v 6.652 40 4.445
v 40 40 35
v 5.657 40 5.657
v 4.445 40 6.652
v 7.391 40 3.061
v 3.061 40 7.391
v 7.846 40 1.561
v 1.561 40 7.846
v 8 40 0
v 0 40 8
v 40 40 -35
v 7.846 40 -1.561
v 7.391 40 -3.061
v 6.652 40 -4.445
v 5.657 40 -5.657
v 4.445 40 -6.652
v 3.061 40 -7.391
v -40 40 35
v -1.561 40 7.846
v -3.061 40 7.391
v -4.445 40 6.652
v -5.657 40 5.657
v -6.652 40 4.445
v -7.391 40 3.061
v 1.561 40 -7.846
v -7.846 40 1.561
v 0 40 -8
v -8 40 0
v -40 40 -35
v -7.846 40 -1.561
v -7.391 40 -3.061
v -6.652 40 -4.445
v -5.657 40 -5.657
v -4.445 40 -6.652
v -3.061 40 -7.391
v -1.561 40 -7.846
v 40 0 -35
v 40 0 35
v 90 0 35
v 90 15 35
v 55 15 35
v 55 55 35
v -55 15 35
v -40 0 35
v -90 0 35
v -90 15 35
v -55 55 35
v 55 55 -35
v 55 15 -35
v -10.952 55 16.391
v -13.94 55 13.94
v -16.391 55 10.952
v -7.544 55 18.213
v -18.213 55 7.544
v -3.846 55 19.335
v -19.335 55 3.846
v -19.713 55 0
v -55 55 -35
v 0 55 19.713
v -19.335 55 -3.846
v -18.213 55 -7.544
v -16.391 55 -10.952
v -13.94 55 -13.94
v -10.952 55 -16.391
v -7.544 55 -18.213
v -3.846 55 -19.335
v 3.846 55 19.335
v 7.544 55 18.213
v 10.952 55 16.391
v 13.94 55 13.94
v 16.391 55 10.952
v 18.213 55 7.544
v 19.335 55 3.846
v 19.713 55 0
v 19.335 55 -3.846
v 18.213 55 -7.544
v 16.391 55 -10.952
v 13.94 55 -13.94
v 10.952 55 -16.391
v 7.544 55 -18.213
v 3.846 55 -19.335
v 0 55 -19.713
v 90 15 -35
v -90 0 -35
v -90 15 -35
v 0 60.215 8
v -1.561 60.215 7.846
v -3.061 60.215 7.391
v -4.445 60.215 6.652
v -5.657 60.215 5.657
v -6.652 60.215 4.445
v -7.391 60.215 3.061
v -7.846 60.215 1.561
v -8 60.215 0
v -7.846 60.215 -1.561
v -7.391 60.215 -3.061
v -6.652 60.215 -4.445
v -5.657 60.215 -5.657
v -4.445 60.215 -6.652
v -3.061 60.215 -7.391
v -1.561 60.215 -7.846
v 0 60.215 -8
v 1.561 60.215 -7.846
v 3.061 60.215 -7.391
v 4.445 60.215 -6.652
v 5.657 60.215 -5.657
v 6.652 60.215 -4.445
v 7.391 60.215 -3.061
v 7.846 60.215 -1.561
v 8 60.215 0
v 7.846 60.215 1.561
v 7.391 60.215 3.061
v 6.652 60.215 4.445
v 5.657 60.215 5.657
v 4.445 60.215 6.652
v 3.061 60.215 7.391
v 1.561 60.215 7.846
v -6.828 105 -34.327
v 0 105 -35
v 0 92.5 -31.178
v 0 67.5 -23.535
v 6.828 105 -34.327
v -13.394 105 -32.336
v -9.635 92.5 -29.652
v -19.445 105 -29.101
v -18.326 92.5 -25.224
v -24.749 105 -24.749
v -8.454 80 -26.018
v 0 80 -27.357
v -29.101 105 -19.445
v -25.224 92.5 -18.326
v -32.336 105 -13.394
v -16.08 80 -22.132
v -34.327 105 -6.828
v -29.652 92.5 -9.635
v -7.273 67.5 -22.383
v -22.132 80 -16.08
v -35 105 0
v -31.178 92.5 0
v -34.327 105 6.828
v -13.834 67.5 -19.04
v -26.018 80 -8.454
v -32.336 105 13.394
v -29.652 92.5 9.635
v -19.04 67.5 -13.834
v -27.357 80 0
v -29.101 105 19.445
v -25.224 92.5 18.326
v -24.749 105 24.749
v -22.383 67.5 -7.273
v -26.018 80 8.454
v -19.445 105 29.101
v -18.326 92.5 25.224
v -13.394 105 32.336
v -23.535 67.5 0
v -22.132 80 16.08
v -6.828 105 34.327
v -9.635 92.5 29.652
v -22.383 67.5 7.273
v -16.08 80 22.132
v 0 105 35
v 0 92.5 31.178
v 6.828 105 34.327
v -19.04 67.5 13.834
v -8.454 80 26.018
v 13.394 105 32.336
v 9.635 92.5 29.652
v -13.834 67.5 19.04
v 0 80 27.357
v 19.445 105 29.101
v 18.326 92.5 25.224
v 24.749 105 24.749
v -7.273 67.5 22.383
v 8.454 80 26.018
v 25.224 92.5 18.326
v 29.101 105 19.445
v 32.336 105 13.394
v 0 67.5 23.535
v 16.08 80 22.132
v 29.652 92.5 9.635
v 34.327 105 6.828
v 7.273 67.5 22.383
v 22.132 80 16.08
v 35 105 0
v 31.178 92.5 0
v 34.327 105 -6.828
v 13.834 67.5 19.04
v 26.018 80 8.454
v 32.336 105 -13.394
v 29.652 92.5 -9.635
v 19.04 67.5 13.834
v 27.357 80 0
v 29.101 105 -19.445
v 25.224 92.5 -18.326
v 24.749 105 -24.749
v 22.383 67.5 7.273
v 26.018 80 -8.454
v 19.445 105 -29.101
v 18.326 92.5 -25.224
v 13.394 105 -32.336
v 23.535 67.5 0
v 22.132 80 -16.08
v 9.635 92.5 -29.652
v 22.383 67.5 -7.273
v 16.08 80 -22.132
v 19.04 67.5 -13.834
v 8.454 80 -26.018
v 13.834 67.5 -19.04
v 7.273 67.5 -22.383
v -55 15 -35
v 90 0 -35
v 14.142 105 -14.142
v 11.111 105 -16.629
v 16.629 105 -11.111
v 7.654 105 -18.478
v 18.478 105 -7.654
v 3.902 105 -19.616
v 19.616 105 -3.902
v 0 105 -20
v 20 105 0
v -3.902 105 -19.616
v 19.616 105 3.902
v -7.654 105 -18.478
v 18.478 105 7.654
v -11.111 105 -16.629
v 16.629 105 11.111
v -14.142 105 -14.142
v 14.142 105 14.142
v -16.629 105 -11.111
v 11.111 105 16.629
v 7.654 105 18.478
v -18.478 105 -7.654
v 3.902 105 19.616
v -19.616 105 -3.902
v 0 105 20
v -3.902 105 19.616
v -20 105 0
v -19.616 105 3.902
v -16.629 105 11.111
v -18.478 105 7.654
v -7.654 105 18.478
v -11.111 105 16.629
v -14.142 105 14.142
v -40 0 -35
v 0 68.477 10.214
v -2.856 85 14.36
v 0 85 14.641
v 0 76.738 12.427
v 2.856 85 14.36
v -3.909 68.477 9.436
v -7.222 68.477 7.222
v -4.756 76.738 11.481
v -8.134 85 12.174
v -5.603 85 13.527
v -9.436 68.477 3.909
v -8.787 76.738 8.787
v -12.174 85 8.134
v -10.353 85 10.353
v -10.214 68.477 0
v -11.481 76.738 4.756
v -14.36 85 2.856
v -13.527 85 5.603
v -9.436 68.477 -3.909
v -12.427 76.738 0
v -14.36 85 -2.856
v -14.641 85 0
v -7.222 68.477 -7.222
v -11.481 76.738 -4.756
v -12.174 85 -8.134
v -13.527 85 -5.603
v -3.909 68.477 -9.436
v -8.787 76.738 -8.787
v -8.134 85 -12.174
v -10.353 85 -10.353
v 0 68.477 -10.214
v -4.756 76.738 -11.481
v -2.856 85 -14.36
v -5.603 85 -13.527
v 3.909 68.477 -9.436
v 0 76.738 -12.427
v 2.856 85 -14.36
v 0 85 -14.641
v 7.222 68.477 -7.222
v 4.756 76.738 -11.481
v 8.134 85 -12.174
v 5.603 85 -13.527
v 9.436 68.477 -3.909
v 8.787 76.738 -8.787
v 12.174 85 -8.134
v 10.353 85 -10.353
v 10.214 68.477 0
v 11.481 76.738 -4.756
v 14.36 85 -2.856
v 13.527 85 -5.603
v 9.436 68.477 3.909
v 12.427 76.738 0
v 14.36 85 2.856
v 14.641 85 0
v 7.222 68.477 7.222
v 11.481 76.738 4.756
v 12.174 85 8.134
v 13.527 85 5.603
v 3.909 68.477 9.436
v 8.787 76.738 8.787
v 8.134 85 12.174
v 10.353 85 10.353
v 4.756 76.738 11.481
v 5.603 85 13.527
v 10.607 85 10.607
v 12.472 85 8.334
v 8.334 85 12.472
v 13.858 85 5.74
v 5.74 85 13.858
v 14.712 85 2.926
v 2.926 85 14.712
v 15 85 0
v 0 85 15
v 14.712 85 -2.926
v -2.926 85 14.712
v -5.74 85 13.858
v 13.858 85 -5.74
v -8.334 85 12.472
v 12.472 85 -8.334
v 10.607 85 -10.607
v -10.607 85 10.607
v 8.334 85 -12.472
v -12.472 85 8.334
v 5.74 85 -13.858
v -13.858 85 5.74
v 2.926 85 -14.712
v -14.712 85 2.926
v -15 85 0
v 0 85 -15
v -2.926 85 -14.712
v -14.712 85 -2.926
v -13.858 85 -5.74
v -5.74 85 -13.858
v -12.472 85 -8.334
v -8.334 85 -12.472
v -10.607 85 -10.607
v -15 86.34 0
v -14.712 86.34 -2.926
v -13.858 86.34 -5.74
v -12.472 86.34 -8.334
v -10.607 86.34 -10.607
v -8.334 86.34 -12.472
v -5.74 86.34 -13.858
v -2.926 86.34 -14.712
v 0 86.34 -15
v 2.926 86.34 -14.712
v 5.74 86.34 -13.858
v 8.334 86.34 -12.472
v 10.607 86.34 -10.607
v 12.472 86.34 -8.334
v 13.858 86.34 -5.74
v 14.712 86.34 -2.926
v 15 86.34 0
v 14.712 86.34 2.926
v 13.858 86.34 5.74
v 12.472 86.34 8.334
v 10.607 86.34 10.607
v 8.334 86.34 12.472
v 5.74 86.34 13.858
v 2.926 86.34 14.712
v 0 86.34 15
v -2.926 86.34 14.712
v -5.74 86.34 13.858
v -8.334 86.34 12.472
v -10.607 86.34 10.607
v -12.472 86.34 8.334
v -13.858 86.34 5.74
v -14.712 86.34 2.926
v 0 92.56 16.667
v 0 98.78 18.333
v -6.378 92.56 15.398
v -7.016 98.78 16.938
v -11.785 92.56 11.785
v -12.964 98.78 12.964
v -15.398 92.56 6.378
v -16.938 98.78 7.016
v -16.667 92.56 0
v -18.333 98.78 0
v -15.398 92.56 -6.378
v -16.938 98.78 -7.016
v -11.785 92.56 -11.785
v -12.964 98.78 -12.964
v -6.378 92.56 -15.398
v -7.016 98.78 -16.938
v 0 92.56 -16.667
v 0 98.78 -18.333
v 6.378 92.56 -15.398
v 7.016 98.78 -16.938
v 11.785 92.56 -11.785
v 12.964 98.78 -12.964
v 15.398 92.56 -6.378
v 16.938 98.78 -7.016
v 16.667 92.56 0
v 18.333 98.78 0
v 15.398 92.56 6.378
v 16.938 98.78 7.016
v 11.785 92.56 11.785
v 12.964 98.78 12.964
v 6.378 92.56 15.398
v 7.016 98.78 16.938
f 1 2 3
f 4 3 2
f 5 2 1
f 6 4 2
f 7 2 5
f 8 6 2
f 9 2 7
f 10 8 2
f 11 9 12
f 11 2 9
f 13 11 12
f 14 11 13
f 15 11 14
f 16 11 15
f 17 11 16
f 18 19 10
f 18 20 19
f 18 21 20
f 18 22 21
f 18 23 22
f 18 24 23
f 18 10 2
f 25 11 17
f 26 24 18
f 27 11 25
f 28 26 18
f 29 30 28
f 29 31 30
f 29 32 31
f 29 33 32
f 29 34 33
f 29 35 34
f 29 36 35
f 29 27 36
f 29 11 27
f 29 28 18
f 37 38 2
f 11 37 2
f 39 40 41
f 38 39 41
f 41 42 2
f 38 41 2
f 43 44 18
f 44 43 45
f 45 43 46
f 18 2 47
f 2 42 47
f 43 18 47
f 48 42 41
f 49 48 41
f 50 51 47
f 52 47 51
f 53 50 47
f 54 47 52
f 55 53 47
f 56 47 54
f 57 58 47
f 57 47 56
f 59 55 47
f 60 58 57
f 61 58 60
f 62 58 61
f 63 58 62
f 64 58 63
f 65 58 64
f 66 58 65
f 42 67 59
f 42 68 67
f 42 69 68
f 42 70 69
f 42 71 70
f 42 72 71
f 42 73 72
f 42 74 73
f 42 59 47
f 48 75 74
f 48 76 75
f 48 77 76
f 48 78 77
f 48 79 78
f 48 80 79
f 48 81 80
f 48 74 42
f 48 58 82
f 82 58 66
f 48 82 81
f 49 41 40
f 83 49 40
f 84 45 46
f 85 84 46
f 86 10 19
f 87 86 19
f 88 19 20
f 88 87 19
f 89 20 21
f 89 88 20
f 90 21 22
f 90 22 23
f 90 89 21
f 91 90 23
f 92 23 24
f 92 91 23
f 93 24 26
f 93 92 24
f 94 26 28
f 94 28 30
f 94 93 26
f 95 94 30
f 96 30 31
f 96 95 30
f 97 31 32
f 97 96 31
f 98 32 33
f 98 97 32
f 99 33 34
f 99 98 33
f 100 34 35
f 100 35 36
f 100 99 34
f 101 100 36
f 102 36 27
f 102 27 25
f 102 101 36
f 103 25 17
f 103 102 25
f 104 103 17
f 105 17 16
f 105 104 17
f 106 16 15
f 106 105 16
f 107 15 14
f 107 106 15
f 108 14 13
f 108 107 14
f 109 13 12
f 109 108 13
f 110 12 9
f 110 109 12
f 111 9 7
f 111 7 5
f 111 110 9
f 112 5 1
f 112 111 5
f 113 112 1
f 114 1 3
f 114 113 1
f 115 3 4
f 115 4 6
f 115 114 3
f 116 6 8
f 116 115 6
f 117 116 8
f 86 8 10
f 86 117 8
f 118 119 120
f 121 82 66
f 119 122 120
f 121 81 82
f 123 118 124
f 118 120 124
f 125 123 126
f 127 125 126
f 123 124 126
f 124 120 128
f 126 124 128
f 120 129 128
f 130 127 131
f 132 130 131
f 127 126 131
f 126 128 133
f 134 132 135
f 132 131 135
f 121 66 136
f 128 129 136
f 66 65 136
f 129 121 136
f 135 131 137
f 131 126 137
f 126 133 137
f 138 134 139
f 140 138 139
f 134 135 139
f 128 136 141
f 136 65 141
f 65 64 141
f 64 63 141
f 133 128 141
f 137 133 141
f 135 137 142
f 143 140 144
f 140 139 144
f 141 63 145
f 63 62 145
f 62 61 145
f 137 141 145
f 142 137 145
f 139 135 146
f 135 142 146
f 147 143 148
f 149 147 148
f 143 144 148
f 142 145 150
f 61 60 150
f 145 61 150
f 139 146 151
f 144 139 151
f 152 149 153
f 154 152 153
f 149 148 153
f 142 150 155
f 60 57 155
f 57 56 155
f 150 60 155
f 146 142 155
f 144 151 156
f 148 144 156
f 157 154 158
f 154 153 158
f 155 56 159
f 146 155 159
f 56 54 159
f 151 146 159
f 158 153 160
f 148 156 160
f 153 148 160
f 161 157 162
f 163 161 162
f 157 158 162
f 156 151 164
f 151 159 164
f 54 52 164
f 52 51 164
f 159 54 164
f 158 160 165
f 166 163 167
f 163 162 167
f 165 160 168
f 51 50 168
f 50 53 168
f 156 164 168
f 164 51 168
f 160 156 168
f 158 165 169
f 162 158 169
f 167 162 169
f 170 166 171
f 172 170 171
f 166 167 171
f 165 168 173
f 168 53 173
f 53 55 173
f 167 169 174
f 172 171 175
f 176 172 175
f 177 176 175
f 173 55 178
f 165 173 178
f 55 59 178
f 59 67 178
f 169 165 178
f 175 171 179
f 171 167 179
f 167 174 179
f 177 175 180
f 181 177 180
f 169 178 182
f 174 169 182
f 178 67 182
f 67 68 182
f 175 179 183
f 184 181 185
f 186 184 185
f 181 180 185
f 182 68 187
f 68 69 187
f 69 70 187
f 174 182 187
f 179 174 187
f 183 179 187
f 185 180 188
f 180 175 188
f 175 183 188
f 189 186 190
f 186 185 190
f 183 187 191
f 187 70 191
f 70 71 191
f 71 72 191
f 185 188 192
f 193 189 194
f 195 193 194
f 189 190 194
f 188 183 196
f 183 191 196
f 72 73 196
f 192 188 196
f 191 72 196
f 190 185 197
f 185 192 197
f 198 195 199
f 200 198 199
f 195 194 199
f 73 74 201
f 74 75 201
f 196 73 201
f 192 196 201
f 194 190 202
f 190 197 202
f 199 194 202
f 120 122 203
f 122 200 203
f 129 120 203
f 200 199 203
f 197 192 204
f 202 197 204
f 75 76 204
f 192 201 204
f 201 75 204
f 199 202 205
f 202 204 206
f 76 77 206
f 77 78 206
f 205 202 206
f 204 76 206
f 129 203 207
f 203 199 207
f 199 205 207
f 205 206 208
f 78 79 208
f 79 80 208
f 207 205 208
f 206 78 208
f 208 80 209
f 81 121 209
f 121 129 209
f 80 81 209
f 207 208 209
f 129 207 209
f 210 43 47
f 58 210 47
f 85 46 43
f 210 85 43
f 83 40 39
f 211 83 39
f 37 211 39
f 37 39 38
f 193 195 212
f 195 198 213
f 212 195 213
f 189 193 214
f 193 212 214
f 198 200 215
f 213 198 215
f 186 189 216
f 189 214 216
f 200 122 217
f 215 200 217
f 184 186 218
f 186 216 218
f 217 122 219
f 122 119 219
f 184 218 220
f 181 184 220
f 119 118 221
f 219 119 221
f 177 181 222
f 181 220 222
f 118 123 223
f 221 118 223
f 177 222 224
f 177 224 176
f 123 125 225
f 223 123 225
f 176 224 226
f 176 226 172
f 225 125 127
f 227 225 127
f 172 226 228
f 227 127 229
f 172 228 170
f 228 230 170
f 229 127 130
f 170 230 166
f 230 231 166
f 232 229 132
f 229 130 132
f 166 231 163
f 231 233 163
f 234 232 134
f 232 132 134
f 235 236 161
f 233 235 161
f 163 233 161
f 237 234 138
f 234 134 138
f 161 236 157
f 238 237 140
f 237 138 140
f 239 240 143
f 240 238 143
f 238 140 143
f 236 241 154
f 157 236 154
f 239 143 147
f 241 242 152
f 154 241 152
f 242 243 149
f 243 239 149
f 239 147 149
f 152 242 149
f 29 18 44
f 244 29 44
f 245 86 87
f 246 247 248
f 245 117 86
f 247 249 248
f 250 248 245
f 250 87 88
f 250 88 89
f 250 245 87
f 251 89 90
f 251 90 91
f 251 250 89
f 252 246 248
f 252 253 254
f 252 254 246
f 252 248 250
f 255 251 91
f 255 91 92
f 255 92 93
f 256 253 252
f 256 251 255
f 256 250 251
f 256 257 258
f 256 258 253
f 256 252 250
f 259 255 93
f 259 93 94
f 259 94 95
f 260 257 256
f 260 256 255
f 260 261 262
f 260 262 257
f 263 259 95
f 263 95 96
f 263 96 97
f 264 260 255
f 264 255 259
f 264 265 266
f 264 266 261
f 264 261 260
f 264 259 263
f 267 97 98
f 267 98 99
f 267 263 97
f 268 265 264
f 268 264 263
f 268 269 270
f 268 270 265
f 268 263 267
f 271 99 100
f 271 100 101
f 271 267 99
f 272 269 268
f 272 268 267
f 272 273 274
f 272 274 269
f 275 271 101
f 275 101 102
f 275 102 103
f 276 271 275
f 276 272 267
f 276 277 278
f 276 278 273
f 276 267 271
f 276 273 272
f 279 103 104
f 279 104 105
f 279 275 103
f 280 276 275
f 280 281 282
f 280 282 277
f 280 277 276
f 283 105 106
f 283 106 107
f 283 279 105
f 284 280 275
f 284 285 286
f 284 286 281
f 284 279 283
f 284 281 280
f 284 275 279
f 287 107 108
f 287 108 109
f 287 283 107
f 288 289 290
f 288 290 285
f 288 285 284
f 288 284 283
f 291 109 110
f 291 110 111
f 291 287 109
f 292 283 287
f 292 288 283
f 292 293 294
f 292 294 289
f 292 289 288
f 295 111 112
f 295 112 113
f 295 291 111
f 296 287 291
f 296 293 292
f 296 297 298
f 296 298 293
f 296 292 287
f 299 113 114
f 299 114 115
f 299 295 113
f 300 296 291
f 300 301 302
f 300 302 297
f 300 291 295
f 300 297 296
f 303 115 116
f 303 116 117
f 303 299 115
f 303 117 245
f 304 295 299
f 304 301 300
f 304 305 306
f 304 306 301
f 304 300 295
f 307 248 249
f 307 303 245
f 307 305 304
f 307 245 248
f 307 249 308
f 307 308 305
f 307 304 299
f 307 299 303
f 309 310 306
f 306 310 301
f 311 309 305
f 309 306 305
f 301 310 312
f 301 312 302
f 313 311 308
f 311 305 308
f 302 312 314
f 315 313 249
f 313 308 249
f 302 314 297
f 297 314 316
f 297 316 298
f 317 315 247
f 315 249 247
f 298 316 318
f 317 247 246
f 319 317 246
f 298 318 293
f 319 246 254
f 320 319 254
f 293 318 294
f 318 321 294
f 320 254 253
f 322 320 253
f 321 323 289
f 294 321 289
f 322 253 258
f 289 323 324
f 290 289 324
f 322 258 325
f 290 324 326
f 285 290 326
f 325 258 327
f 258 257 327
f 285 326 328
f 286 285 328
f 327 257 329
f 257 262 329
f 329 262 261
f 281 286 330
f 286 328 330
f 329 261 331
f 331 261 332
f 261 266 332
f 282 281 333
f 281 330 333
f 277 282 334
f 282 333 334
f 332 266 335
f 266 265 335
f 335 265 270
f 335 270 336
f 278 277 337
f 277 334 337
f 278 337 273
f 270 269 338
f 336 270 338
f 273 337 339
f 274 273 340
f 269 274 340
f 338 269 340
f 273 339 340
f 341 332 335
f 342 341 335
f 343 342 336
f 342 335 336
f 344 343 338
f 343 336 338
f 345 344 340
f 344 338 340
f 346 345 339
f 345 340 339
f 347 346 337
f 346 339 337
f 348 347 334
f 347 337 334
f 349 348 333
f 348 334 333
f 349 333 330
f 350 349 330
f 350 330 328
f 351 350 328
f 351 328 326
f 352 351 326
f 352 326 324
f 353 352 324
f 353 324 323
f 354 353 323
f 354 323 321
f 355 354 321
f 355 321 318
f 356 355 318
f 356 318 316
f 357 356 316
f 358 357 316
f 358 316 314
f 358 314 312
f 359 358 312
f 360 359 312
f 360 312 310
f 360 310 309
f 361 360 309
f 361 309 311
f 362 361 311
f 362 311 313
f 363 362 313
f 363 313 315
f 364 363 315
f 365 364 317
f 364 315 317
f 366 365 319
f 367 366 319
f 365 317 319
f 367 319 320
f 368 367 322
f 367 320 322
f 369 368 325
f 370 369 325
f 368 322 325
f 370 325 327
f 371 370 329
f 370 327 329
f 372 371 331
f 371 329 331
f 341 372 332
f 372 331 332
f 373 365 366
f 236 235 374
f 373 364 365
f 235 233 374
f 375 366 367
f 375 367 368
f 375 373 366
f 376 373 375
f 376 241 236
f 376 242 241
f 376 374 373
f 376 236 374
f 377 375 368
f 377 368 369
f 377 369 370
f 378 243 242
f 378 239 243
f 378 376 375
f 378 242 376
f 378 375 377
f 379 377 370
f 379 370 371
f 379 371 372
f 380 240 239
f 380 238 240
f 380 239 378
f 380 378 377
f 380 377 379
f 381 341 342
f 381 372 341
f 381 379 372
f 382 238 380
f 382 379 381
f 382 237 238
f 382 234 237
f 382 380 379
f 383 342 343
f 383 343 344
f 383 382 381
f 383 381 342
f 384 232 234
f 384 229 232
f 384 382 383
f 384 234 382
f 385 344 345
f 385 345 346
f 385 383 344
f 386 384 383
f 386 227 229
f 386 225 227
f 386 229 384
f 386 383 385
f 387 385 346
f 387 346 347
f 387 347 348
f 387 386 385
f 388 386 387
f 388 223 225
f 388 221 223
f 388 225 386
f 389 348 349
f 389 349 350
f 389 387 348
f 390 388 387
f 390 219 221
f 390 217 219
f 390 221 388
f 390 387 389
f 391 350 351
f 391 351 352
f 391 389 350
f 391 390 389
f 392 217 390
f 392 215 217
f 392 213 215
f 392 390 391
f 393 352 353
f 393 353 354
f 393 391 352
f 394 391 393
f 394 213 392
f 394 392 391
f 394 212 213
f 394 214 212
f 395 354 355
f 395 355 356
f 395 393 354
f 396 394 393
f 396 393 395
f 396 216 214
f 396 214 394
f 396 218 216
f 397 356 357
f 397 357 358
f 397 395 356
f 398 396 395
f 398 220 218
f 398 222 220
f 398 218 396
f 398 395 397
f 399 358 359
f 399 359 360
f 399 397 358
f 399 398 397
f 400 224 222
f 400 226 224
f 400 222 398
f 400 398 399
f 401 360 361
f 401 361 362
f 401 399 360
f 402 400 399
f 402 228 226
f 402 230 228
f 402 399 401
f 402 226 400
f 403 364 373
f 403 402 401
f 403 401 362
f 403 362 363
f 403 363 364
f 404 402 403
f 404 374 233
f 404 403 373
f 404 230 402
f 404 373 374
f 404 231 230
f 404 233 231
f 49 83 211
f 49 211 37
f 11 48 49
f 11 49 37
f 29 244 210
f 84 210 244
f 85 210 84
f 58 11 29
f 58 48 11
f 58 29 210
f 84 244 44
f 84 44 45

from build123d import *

# Parameters (mm, degrees)
BOSS_EXTRUDE1_DEPTH      = 35
BOSS_EXTRUDE1_DEPTH_BACK = 35
HOLE1_D                  = 30
HOLE1_DEPTH              = 20


with BuildPart() as part:
    # Sketch1 → Boss-Extrude1 (new, two sides: drawn at the far end of the back side and taken through both)
    with BuildSketch(Plane.XY.offset(-BOSS_EXTRUDE1_DEPTH_BACK)):
        Polygon((-90, 0), (-90, 15), (-55, 15), (-55, 55), (55, 55), (55, 15), (90, 15), (90, 0), (40, 0), (40, 40), (-40, 40), (-40, 0), align=None)
    extrude(amount=BOSS_EXTRUDE1_DEPTH + BOSS_EXTRUDE1_DEPTH_BACK)

    # Sketch3 → Revolve1 (revolve)
    with BuildSketch(Plane.XY):
        Polygon((0, 105), (35, 105), (19.713465927, 55), (0, 55), align=None)
    revolve(axis=Axis((0, 0, 0), (0, 1, 0)))

    # Hole1
    with Locations(Plane(origin=(0, 105, 0), x_dir=(1, 0, 0), z_dir=(0, 1, 0))):
        with Locations((0, 0)):
            Hole(HOLE1_D / 2, depth=HOLE1_DEPTH)

    # Sketch7 → Hole2 (revolve, cut)
    with BuildSketch(Plane(origin=(0, 105, 0), x_dir=(0, 0, 1), z_dir=(1, 0, 0))):
        Polygon((0, 0), (0, 69.806884952), (8, 65), (8, 44.784609691), (20, 0), align=None)
    revolve(axis=Axis((0, 119.308894879, 0), (0, -1, 0)), mode=Mode.SUBTRACT)


solid = part.part
